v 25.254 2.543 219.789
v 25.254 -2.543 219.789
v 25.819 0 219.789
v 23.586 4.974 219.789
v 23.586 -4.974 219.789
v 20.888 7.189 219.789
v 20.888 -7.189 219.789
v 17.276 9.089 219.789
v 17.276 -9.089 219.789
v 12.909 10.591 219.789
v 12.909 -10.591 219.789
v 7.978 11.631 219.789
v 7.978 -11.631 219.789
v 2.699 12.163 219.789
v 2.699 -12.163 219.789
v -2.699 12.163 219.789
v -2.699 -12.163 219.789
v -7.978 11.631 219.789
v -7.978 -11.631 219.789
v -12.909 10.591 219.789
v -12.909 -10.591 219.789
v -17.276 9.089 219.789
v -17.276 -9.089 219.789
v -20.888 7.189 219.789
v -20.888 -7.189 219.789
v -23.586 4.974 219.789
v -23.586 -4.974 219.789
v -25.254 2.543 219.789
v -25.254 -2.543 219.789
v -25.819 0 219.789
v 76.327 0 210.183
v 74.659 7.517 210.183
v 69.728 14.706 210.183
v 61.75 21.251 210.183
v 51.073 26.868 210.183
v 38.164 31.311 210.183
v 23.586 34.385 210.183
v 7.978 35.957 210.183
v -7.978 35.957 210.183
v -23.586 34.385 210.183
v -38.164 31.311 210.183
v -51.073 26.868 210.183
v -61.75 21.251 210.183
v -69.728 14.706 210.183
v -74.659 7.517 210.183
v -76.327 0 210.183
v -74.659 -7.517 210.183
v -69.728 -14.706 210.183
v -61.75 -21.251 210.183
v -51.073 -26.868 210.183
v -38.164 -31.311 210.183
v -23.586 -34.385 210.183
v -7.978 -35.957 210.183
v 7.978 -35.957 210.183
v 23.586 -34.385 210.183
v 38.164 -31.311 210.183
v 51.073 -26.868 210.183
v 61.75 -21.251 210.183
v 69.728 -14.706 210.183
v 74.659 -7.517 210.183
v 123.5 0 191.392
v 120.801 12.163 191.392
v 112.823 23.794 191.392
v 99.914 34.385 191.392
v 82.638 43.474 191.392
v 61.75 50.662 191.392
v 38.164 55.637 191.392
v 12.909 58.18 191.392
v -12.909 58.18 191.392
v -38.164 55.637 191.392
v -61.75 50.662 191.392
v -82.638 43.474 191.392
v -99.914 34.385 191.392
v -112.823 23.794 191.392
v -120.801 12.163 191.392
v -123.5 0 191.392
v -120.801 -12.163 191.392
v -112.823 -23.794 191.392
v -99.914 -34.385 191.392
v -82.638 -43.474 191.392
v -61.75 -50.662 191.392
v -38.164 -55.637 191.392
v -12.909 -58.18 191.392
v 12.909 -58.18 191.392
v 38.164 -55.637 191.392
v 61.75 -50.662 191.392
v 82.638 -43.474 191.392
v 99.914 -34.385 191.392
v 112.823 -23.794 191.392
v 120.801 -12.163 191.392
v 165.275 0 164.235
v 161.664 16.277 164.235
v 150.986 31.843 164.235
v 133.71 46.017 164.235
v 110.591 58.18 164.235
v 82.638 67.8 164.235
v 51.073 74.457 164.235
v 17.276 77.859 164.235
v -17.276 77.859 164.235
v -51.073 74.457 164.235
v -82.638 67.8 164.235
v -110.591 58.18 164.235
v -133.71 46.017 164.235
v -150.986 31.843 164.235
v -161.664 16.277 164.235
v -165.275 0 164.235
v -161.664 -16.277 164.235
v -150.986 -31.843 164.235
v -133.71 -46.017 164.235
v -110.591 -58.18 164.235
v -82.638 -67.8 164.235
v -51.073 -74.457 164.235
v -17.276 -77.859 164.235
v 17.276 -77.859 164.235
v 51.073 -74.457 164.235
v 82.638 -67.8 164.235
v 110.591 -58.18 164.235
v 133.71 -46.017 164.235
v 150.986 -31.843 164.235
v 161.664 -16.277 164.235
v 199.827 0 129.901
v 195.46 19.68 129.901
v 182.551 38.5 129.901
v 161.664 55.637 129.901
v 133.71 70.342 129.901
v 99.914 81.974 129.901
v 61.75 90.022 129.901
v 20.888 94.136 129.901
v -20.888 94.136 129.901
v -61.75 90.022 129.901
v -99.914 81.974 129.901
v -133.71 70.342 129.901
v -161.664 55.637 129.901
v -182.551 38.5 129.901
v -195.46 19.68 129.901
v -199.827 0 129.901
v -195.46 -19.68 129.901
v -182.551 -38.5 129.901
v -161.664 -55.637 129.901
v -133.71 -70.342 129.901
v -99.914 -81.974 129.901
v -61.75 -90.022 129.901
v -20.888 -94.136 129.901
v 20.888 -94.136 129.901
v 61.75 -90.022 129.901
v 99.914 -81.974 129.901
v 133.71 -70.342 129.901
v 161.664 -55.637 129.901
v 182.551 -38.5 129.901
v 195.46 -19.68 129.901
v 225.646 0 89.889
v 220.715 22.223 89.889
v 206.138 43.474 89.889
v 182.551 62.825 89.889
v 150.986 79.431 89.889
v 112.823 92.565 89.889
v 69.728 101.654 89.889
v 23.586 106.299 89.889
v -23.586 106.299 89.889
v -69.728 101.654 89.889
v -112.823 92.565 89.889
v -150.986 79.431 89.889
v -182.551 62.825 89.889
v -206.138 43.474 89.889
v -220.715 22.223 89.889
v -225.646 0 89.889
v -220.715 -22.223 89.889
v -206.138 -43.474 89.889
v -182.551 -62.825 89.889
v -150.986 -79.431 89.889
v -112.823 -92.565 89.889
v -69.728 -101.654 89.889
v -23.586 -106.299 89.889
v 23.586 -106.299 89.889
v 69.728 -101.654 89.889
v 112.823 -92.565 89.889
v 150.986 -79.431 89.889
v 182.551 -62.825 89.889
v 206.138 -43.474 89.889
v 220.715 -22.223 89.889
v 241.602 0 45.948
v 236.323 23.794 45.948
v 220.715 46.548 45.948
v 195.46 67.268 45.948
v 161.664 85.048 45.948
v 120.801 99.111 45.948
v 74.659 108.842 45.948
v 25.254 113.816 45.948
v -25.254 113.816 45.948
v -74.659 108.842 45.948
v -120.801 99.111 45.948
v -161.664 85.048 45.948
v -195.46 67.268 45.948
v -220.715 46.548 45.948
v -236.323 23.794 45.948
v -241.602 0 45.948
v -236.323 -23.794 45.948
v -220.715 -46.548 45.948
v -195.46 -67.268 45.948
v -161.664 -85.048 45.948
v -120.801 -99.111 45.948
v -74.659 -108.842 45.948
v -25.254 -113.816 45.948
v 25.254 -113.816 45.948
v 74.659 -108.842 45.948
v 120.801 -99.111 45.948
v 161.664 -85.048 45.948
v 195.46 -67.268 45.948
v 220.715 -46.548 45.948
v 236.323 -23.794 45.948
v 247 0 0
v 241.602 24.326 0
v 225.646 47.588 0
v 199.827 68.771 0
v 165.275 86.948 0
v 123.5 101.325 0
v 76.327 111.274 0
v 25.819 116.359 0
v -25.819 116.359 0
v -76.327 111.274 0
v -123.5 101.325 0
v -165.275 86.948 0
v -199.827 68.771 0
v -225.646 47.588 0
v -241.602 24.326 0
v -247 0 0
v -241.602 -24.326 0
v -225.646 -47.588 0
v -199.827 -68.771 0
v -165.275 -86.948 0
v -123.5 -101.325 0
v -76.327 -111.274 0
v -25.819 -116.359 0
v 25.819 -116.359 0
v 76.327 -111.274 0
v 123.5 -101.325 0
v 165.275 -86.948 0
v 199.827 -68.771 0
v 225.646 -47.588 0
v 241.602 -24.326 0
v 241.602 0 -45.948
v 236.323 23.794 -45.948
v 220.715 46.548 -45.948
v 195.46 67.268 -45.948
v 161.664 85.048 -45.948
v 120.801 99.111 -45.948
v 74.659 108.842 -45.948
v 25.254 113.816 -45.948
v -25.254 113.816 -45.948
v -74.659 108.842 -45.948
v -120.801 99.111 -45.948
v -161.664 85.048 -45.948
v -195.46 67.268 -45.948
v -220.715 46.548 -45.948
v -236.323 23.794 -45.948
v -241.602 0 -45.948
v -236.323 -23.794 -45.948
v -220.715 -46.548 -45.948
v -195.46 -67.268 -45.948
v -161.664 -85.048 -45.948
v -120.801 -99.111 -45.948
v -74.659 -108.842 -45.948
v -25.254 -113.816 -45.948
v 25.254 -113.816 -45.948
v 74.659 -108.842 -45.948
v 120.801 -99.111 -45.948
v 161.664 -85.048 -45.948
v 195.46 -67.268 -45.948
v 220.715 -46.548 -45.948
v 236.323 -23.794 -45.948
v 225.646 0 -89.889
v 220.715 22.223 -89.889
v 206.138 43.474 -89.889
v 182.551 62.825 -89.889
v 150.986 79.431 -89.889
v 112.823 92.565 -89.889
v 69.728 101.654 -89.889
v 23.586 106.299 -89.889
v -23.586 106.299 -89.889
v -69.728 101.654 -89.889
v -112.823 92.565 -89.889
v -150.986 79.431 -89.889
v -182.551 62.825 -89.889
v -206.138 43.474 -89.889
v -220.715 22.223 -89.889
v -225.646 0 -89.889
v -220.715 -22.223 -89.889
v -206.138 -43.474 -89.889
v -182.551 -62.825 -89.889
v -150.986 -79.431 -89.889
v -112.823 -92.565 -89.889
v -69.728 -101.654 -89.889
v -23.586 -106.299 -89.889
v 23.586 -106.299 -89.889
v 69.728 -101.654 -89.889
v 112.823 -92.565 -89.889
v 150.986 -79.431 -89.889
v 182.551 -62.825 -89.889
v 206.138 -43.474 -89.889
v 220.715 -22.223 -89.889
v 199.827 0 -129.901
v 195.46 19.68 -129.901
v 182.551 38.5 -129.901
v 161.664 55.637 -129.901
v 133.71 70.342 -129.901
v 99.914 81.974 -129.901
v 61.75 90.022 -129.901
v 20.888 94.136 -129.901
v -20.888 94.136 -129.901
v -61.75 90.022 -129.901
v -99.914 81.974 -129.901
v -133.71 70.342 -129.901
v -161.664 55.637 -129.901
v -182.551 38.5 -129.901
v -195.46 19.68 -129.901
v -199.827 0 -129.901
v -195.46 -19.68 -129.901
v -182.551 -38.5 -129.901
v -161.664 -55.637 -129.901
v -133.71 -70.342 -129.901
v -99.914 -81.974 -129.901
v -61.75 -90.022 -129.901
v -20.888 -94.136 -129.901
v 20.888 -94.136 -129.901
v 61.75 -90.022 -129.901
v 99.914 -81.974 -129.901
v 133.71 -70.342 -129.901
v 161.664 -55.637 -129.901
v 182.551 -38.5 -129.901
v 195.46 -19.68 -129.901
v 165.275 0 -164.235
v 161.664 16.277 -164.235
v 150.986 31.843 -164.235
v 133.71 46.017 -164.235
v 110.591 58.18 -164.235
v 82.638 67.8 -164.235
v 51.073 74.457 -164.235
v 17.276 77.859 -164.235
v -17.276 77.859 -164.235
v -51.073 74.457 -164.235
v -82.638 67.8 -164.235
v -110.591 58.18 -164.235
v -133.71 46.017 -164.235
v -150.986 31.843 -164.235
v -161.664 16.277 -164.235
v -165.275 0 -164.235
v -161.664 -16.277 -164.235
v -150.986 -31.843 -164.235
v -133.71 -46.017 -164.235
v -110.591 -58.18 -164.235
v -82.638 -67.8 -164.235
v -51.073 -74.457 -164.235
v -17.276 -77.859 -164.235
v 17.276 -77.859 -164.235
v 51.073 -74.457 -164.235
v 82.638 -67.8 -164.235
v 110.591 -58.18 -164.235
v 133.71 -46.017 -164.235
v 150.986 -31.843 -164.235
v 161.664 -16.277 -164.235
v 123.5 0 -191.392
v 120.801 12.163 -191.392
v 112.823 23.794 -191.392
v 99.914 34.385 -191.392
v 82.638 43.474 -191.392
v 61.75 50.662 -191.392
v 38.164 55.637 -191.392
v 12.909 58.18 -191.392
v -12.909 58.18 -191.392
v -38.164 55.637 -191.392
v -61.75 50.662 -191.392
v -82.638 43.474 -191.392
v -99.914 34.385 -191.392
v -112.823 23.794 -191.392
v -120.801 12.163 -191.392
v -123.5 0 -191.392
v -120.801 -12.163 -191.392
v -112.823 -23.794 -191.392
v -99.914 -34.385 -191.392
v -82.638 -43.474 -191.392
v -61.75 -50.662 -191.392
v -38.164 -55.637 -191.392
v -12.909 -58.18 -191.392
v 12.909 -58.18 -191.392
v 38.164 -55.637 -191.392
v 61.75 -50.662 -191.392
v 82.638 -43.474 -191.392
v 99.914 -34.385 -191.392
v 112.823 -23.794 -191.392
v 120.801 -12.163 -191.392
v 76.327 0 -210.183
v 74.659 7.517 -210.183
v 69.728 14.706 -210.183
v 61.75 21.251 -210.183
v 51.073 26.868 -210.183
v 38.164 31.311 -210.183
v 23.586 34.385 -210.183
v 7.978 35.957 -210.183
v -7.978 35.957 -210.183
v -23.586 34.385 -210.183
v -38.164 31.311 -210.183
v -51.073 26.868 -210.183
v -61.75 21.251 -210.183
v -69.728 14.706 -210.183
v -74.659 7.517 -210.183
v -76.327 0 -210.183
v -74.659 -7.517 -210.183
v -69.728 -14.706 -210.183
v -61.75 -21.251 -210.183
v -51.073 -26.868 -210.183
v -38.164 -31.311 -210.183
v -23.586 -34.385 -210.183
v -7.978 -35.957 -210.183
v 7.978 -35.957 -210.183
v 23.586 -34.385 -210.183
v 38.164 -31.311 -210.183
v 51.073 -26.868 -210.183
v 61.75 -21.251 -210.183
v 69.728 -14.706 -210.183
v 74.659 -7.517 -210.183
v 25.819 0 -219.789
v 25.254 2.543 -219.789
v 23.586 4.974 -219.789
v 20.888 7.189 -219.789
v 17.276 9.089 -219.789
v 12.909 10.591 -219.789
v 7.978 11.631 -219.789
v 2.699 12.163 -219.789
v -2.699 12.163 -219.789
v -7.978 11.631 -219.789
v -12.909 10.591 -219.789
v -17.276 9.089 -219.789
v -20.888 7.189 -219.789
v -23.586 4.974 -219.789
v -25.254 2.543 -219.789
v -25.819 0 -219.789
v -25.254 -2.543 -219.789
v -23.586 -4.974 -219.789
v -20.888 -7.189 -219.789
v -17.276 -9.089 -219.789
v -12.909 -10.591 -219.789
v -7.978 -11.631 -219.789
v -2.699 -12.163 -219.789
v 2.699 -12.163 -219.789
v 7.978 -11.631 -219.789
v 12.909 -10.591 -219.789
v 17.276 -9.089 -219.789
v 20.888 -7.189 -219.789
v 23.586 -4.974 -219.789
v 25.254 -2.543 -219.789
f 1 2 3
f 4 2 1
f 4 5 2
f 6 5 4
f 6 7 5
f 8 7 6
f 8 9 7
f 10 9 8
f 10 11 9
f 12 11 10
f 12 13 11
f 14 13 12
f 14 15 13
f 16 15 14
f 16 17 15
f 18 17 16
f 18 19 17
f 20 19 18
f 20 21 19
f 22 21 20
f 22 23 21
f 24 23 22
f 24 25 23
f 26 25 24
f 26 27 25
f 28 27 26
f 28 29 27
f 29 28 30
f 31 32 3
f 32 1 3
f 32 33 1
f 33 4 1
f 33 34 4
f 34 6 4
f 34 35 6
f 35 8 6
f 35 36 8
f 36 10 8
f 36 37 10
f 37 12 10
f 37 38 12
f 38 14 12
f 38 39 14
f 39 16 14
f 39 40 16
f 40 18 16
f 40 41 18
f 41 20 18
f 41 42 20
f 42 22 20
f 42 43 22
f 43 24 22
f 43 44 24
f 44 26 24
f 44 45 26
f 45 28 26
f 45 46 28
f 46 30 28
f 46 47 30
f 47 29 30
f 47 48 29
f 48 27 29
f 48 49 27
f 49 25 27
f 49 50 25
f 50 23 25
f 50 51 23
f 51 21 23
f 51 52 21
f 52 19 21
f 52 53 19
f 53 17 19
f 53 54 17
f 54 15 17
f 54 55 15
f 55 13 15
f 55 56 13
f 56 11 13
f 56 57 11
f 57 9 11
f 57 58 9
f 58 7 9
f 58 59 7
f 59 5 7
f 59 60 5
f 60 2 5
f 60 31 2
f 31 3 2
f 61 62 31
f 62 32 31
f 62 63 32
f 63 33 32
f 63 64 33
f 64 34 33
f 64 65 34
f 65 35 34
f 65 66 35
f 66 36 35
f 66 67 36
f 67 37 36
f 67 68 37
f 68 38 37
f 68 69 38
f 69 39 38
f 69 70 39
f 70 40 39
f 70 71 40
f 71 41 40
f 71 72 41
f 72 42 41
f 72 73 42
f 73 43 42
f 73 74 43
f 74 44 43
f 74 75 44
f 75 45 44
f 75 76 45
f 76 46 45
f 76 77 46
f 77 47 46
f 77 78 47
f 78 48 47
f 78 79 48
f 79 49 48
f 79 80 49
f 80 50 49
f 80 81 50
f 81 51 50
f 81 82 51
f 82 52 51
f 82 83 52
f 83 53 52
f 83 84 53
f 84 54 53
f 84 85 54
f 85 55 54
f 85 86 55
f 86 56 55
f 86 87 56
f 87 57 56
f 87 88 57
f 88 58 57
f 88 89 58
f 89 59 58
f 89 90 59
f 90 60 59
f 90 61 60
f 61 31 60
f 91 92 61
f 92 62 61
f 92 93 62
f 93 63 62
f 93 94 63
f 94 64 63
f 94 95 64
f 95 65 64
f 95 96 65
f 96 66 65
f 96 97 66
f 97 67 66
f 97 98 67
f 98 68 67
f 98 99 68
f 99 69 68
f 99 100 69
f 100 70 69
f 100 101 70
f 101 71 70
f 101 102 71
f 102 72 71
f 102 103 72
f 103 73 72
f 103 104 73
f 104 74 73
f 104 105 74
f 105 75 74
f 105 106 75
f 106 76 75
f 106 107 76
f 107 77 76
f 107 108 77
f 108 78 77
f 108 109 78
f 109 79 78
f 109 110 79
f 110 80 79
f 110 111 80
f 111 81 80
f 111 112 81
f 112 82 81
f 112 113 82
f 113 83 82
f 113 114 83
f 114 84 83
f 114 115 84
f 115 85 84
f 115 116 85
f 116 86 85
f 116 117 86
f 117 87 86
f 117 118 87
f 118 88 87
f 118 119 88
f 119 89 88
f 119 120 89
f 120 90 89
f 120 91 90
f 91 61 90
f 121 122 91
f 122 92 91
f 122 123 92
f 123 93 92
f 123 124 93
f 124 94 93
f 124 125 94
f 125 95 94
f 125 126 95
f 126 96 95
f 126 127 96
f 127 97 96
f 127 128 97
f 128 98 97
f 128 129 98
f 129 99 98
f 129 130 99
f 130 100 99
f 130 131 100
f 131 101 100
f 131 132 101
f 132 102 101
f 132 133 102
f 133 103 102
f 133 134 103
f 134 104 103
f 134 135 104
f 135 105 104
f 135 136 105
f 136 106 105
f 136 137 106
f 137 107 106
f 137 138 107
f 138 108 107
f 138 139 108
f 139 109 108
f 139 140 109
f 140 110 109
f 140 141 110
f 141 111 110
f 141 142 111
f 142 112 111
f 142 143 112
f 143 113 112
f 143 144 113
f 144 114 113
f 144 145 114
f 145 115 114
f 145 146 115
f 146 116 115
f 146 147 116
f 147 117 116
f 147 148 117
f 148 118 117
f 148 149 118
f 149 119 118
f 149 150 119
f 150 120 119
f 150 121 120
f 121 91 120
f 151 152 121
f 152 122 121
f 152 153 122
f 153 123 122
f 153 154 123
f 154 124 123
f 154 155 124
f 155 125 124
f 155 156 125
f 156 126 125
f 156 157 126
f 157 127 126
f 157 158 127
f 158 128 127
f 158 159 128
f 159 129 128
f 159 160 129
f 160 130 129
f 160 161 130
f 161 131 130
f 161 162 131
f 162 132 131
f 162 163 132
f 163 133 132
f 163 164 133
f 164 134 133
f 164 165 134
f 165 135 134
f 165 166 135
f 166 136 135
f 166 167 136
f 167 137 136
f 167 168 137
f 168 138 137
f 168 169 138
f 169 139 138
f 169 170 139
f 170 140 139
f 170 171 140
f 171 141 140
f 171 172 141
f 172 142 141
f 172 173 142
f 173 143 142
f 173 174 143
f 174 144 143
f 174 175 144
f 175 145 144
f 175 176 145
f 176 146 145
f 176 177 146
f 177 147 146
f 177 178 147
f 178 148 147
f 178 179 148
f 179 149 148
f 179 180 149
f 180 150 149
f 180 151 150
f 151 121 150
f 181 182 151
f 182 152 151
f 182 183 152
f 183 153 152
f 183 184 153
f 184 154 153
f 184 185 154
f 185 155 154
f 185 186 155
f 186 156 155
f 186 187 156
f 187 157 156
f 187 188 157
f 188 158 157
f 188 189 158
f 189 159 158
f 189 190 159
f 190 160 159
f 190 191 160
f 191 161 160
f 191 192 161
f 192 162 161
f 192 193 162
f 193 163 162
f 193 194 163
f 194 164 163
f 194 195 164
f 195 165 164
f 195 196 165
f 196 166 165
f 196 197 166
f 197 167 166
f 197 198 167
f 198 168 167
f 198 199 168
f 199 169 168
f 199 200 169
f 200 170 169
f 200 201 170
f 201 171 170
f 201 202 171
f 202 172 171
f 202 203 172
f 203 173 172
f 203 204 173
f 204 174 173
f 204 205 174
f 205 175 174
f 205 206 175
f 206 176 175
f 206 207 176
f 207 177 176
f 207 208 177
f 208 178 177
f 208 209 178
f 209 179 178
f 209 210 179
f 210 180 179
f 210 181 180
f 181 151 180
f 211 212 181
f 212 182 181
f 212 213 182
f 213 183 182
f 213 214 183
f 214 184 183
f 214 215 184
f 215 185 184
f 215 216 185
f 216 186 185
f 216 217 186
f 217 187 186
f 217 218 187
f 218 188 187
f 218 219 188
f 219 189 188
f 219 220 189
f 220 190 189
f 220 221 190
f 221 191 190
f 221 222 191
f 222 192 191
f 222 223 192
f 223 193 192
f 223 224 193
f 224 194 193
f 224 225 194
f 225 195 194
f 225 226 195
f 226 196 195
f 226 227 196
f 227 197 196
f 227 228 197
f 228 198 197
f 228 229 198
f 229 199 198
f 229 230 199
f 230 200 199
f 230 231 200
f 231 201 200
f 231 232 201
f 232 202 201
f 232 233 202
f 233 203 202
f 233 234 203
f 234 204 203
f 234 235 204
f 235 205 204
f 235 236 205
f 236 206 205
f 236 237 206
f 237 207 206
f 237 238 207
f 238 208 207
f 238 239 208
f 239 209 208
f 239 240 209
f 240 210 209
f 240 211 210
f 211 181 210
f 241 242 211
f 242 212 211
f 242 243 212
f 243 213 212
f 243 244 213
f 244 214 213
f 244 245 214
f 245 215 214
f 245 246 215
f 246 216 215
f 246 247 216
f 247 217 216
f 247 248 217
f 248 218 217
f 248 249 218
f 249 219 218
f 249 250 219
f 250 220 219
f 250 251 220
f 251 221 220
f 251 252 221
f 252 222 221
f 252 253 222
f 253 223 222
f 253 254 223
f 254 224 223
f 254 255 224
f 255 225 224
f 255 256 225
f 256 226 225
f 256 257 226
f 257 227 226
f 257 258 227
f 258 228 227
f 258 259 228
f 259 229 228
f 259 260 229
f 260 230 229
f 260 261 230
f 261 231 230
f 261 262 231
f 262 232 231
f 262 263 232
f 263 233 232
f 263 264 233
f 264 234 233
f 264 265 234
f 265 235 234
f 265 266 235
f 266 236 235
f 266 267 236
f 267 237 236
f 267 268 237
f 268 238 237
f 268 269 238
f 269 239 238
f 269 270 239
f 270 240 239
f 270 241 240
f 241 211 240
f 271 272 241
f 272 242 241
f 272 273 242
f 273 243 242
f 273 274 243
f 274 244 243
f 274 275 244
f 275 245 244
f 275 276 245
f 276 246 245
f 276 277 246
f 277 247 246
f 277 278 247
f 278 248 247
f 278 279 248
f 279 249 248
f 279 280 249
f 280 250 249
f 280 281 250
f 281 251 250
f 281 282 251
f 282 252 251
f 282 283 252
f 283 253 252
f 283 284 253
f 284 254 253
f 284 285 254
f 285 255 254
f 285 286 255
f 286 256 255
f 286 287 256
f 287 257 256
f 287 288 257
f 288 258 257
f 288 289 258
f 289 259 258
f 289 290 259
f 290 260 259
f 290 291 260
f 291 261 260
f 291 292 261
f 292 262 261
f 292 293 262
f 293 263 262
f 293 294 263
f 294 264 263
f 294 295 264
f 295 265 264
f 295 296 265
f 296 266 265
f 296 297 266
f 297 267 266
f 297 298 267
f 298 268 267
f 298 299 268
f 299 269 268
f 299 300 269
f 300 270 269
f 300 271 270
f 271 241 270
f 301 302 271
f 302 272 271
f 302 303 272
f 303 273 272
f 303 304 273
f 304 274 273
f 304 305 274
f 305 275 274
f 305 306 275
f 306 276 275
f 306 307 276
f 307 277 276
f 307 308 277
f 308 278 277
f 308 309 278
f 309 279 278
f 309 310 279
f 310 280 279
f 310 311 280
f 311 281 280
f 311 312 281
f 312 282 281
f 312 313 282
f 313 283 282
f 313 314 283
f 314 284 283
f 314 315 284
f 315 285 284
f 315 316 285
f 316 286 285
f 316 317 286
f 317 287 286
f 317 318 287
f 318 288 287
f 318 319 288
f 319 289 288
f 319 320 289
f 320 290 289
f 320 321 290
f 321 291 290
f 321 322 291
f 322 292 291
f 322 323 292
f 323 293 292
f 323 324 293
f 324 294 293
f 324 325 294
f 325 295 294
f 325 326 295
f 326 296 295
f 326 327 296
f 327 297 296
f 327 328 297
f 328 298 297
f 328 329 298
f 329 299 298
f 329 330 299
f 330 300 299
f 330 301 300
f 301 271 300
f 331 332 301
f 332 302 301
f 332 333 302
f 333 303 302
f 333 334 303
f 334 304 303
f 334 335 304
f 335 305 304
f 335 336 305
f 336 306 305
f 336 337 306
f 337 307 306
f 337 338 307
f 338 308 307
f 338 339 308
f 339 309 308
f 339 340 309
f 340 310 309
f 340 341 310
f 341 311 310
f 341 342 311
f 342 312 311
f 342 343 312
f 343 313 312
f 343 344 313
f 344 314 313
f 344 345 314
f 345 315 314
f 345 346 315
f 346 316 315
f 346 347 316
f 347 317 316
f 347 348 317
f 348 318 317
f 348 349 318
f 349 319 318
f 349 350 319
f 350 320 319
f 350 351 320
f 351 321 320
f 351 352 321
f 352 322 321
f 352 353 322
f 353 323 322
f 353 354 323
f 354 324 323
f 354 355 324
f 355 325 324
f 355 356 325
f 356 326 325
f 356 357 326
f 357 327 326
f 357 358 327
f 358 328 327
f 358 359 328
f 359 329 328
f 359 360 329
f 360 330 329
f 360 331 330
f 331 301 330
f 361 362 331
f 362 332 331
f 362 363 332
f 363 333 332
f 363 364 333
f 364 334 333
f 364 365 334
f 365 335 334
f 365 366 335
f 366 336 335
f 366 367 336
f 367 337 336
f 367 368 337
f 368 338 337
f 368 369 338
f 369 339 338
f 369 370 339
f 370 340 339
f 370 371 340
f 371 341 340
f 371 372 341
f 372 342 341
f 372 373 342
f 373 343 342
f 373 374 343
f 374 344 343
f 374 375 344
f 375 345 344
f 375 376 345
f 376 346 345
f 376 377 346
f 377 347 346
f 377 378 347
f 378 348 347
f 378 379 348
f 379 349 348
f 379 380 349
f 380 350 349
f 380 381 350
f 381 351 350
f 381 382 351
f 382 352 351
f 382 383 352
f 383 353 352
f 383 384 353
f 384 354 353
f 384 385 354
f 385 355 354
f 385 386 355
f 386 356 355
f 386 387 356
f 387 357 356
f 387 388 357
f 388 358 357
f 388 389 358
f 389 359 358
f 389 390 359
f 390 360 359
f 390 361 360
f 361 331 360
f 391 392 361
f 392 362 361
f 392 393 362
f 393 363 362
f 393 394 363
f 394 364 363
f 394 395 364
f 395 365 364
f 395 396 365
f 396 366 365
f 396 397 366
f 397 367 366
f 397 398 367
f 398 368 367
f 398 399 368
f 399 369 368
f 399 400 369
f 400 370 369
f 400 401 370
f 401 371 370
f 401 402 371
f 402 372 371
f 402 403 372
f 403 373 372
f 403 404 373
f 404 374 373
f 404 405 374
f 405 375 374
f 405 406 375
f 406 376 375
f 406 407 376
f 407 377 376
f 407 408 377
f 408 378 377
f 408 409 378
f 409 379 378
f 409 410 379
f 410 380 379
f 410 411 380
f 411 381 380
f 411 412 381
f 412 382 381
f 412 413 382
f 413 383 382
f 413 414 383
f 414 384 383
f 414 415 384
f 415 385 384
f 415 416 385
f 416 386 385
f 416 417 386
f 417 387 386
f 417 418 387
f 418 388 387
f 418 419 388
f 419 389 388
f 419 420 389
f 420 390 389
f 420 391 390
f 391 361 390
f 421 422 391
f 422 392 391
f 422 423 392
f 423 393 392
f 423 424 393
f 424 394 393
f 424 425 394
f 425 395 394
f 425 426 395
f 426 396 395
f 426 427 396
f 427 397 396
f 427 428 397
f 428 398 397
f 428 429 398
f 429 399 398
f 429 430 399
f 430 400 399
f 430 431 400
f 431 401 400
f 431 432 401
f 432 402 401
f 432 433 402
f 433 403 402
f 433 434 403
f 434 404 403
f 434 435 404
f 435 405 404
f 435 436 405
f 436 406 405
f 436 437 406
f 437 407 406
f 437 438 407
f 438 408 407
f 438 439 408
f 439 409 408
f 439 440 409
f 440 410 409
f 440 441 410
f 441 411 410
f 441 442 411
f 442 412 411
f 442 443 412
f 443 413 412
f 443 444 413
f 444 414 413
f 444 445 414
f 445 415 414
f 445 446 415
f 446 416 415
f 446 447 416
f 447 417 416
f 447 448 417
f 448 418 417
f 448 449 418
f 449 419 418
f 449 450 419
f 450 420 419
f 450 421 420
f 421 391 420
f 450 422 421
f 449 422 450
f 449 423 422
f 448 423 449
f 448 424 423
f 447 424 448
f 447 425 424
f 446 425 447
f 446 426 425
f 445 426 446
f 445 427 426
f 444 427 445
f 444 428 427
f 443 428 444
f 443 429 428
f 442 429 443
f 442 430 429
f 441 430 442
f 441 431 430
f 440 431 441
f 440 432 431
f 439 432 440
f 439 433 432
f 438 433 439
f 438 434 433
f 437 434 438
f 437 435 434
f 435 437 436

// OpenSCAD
// Generated by SolidPython 1.0.1 on 2020-07-29 00:46:54


scale(v = [19, 9, 17]) {
	sphere(r = 13);
}
/***********************************************
*********      SolidPython code:      **********
************************************************
 
# import packages: SolidPython
from solid import *
from solid.utils import *
from itertools import chain, combinations, permutations


class Resize:

    def __init__(self, scad_file):
        self.scad_file = scad_file
        #self.scad_file = import_scad(scad_file)
        # cone/cylinder param:
        self.r1 = 0
        self.r2 = 0
        self.h = 0
        # rectangular prism param:
        self.w = 0
        self.l = 0
        # ellipse param:
        self.r = 0

    # import OpenScad code (file name corresponds to shape)


    # classify shape + parameters
    def assign(self, param1, param2, param3):
        if self.scad_file == 'cone.scad':
            self.r1 = param1
            self.r2 = param2
            self.h = param3
        elif self.scad_file == 'cylinder.scad':
            self.r1 = param1
            self.r2 = param2
            self.h = param3
        elif self.scad_file == 'rectangularPrism.scad':
            self.h = param1
            self.l = param2
            self.w = param3
        else:
            self.r = param1
            self.h = param2

    # resize parameters
    def iterate(self):
        x = range(3, 20, 2)
        i = 1
        if self.scad_file == 'cone.scad':
            tempList = list(permutations(x, 2))
            for temp in tempList:
                param1 = temp[0]
                param2 = temp[1]
                filepath = 'produced_scad_files/' + 'cone' + str(param1) + '_' + str(param2) + '_' + '.scad'
                scad_render_to_file(cylinder(h=param1, r1=param2, r2=0), filepath)

        elif self.scad_file == 'cylinder.scad':
            tempList = list(permutations(x, 3))
            for temp in tempList:
                param1 = temp[0]
                param2 = temp[1]
                filepath = 'produced_scad_files/' + 'cylinder' + str(param1) + '_' + str(param2) + '_' + '.scad'
                scad_render_to_file(cylinder(h=param1, r1=param2, r2=param2), filepath)

        elif self.scad_file == 'rectangularPrism.scad':
            tempList = list(permutations(x, 3))
            for temp in tempList:
                param1 = temp[0]
                param2 = temp[1]
                param3 = temp[2]
                filepath = 'produced_scad_files/' + 'rectangularPrism' + str(param1) + '_' + str(param2) + '_' + str(
                    param3) + '.scad'
                scad_render_to_file(cube(size=(param1, param2, param3)), filepath)

        elif self.scad_file == 'ellipse.scad':
            tempList = list(permutations(x, 4))
            for temp in tempList:
                param1 = temp[0]
                param2 = temp[1]
                param3 = temp[2]
                param4 = temp[3]
                filepath = 'produced_scad_files/' + 'ellipse' + str(param1) + '_' + str(param2) + '_' + str(param3) + '_' + str(param4) + '.scad'
                scad_render_to_file(scale([param1, param2, param3])(sphere(r=param4)), filepath)

    def render_to_scadfile(self):
        scad_render_to_file(scad, 'example.scad') 
 
************************************************/
